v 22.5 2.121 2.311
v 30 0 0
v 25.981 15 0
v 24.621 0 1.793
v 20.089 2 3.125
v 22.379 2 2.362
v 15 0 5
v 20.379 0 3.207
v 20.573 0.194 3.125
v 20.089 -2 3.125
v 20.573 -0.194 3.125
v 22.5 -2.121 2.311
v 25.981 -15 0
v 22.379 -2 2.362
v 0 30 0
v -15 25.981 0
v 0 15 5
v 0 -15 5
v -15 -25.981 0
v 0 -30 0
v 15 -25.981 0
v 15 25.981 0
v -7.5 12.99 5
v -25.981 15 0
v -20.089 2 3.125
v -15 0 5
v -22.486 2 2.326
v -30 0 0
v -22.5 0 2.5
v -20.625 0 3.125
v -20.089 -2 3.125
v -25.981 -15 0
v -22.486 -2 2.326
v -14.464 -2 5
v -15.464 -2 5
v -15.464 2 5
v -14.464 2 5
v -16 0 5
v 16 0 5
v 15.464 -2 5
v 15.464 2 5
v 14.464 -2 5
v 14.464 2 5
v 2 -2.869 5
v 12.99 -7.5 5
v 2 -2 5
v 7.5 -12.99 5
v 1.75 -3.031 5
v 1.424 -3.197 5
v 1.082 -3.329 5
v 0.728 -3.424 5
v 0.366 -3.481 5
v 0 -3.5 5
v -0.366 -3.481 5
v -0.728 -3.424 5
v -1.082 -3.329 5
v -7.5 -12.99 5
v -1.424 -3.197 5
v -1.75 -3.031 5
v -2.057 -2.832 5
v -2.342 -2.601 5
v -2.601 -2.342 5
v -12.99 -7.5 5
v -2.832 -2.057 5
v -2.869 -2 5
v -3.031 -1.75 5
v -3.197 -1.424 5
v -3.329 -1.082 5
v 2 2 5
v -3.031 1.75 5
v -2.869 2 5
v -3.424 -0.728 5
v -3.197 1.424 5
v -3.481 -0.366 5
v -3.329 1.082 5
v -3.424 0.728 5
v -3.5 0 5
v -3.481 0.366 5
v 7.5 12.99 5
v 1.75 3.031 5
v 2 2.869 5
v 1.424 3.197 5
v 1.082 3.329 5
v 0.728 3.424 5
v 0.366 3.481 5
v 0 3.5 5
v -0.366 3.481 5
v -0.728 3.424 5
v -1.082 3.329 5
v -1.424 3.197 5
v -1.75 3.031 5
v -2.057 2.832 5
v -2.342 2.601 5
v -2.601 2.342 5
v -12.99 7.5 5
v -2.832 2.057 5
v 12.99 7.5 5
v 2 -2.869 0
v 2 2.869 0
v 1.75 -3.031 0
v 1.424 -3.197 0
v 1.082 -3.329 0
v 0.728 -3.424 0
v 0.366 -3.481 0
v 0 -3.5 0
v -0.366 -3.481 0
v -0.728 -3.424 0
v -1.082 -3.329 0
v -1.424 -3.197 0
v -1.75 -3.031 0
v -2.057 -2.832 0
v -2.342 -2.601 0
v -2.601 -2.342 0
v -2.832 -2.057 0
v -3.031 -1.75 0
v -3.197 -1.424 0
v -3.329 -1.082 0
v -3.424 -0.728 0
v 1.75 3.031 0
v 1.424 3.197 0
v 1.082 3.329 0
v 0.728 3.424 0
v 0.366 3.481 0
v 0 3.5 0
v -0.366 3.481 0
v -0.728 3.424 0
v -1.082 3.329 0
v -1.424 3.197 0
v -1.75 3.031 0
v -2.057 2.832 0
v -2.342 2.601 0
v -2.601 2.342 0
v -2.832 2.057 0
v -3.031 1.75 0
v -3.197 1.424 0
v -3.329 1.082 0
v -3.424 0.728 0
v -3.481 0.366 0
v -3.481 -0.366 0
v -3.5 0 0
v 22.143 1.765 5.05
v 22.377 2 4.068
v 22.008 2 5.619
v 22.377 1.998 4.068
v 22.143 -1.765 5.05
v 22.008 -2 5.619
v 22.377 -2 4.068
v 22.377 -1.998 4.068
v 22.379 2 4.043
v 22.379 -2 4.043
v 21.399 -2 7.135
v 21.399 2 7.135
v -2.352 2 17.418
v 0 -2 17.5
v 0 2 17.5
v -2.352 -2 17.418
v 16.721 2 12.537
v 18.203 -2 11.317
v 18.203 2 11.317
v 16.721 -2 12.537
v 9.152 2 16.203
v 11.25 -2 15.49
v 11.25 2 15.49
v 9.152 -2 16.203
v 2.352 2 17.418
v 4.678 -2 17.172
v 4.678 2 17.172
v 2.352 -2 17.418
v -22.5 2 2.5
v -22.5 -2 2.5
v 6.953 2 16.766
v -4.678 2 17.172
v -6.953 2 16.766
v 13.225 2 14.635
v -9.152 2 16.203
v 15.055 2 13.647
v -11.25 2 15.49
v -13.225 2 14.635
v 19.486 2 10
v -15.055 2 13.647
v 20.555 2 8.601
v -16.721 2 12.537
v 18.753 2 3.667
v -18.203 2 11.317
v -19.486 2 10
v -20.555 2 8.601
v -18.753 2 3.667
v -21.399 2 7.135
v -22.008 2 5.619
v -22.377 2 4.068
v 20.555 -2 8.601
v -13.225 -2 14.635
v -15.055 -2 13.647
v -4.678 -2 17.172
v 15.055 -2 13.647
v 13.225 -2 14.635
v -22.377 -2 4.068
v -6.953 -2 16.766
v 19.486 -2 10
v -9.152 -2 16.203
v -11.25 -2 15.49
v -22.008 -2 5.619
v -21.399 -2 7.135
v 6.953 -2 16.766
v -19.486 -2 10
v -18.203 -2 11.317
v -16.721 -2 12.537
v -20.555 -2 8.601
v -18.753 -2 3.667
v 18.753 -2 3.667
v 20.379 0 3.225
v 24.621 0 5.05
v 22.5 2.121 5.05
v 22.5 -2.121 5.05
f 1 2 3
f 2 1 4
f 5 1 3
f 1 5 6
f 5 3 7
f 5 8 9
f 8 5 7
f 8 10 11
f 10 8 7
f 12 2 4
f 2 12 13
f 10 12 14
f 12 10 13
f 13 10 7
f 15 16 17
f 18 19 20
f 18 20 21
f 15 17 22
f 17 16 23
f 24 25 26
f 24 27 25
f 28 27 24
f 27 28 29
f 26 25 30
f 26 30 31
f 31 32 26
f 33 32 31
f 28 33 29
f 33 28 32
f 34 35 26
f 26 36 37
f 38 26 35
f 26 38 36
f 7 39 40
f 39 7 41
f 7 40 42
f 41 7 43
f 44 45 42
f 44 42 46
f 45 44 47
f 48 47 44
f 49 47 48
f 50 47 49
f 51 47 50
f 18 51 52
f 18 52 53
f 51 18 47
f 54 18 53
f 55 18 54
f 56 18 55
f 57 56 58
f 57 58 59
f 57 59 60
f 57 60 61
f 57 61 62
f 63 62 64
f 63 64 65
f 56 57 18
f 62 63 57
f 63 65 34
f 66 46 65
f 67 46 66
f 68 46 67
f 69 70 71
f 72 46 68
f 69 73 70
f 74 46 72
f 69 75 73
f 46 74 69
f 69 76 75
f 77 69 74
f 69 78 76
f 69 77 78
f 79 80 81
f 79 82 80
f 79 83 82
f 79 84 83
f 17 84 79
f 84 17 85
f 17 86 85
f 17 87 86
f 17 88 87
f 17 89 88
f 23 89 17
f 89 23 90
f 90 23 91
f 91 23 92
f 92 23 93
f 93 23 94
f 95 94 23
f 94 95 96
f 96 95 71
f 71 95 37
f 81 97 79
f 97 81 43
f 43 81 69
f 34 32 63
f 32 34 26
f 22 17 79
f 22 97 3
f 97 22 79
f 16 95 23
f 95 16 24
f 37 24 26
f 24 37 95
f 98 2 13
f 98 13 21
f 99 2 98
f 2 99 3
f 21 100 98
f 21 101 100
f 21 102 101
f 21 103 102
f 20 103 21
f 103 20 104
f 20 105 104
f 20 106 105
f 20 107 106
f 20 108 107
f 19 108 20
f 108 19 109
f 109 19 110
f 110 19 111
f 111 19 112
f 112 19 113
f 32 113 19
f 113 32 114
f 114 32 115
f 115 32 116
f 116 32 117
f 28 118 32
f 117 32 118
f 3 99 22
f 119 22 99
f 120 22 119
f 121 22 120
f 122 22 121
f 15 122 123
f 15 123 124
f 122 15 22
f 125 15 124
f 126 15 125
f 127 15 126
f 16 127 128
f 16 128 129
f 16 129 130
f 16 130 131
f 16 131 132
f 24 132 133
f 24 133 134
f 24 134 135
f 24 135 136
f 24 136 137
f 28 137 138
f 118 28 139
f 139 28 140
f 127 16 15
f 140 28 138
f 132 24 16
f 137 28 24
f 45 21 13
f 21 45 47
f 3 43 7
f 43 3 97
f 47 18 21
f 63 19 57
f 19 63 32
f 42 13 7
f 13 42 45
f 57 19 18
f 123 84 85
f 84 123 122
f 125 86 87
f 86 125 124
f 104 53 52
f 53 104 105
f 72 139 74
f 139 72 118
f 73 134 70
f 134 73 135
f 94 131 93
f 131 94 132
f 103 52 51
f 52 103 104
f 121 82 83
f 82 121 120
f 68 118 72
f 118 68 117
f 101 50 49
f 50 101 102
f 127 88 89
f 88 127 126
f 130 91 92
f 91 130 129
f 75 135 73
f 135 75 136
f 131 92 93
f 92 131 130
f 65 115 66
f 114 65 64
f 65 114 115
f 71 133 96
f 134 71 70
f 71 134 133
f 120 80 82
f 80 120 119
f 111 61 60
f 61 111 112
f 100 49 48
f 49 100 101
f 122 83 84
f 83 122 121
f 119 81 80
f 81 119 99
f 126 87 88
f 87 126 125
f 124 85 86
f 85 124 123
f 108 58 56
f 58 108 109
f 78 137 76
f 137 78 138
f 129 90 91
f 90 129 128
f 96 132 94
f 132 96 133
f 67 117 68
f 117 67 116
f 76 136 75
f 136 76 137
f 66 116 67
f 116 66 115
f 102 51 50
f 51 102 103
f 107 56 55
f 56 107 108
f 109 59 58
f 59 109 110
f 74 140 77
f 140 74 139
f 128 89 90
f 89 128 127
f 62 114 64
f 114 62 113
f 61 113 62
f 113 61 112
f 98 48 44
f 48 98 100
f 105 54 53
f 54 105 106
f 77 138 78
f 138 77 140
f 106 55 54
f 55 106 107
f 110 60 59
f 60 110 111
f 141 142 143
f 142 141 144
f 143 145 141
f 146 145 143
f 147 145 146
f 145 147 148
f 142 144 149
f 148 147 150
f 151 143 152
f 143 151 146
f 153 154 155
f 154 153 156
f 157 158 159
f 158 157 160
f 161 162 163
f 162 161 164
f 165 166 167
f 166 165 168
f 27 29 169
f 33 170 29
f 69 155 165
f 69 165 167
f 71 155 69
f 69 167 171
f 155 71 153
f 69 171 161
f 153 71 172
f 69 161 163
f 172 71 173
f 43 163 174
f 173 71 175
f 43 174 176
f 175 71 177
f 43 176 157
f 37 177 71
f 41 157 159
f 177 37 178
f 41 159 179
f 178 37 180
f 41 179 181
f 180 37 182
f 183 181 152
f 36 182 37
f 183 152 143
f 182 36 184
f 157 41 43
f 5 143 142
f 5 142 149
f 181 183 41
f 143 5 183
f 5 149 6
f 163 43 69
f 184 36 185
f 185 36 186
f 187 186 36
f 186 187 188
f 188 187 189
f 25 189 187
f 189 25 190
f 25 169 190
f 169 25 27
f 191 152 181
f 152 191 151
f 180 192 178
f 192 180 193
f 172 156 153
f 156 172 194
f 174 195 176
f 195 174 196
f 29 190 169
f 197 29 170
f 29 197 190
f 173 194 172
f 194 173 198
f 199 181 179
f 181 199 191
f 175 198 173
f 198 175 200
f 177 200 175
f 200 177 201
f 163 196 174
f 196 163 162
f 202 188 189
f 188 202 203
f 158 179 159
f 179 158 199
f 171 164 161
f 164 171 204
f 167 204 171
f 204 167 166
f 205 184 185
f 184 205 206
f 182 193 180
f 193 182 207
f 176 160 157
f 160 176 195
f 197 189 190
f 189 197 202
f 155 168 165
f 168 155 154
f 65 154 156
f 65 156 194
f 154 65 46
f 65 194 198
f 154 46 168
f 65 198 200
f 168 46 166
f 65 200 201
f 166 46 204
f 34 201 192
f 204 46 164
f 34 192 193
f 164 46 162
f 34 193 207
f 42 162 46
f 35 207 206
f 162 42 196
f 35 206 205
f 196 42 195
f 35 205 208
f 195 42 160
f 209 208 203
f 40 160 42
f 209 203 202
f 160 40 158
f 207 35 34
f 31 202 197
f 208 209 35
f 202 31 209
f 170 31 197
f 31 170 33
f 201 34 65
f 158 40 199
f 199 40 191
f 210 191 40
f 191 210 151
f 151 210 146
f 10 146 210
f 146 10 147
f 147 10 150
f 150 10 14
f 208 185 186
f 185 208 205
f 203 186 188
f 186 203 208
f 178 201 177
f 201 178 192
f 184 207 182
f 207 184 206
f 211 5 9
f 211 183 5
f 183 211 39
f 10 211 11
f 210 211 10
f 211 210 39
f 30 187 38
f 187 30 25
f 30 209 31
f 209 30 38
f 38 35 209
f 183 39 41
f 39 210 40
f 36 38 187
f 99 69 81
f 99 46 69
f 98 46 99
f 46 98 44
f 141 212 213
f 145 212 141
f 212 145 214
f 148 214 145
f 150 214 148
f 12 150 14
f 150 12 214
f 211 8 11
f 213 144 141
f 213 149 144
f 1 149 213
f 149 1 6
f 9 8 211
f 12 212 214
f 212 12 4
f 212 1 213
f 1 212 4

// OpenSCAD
// Base width at top
W=30;

// Base width at bottom
BW=60;

// Base height
H=5;

// Number of edges
FN = 12;

// Diameter of hole
ID=7;

// Hole edge offset
EDGE=1.5;

// Handle height
HH = 30;

// Handle width
HW = 4;

// HANDLE X-AXIS SCALE
HXAS = 1.5;

union(){
    difference(){
        cylinder(d1=BW,d2=W,h=H,$fn=FN);
        translate([0,0,-1])cylinder(d=ID,h=H+2,$fn=60);
    }
    x = 1;
    translate([ID-EDGE,0,H/2])cube([ID,ID,H],true);
    difference(){
        scale([HXAS,1,1])translate([0,HW/2,H/2])rotate([90,0,0])cylinder(d=HH,h=4,$fn=60);
        translate([0,0,-HH+H])cylinder(d1=BW*3,d2=HH+2,h=HH,$fn=12);
    }
    translate([HH*HXAS/2,0,H/2+.05])rotate([0,0,45])cube([3,3,H],true);
}
